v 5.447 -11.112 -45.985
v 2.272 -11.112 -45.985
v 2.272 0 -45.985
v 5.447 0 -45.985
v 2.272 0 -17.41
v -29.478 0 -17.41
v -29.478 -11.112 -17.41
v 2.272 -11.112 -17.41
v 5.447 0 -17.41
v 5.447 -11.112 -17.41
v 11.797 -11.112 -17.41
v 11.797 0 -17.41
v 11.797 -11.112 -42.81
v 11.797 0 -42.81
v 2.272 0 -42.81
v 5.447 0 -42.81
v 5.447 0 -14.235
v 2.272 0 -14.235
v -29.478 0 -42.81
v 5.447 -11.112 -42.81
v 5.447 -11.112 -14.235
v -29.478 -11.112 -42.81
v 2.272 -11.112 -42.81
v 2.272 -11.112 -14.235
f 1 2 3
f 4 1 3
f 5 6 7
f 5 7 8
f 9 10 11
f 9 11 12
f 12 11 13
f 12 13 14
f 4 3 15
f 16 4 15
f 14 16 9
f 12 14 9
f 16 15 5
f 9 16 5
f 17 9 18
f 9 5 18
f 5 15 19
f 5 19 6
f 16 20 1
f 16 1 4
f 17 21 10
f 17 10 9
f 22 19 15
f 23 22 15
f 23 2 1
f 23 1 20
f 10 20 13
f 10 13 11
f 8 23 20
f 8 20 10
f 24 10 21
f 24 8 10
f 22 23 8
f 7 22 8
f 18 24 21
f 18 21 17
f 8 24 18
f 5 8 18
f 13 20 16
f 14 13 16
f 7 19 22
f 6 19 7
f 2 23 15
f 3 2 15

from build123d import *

# Parameters (mm, degrees)
F0_W     = 31.75
F0_H     = 25.4
F1_DEPTH = 11.1125
F2_W     = 11.1125
F2_H     = 31.75
F3_DEPTH = 3.175
F4_W     = 11.1125
F4_H     = 25.4
F5_DEPTH = 6.35


with BuildPart() as f1:
    # F0 (on Front) → F1 (new body)
    with BuildSketch(Plane.XZ):
        with Locations((-13.603202, -30.109987)):
            Rectangle(F0_W, F0_H)
    extrude(amount=F1_DEPTH)

    # F2 (on face) → F3 (join)
    with BuildSketch(Plane.YZ.offset(2.271798)):
        with Locations((-5.55625, -30.109987)):
            Rectangle(F2_W, F2_H)
    extrude(amount=F3_DEPTH)

    # F4 (on face) → F5 (join)
    with BuildSketch(Plane.YZ.offset(5.446798)):
        with Locations((-5.55625, -30.109987)):
            Rectangle(F4_W, F4_H)
    extrude(amount=F5_DEPTH)


solid = f1.part
